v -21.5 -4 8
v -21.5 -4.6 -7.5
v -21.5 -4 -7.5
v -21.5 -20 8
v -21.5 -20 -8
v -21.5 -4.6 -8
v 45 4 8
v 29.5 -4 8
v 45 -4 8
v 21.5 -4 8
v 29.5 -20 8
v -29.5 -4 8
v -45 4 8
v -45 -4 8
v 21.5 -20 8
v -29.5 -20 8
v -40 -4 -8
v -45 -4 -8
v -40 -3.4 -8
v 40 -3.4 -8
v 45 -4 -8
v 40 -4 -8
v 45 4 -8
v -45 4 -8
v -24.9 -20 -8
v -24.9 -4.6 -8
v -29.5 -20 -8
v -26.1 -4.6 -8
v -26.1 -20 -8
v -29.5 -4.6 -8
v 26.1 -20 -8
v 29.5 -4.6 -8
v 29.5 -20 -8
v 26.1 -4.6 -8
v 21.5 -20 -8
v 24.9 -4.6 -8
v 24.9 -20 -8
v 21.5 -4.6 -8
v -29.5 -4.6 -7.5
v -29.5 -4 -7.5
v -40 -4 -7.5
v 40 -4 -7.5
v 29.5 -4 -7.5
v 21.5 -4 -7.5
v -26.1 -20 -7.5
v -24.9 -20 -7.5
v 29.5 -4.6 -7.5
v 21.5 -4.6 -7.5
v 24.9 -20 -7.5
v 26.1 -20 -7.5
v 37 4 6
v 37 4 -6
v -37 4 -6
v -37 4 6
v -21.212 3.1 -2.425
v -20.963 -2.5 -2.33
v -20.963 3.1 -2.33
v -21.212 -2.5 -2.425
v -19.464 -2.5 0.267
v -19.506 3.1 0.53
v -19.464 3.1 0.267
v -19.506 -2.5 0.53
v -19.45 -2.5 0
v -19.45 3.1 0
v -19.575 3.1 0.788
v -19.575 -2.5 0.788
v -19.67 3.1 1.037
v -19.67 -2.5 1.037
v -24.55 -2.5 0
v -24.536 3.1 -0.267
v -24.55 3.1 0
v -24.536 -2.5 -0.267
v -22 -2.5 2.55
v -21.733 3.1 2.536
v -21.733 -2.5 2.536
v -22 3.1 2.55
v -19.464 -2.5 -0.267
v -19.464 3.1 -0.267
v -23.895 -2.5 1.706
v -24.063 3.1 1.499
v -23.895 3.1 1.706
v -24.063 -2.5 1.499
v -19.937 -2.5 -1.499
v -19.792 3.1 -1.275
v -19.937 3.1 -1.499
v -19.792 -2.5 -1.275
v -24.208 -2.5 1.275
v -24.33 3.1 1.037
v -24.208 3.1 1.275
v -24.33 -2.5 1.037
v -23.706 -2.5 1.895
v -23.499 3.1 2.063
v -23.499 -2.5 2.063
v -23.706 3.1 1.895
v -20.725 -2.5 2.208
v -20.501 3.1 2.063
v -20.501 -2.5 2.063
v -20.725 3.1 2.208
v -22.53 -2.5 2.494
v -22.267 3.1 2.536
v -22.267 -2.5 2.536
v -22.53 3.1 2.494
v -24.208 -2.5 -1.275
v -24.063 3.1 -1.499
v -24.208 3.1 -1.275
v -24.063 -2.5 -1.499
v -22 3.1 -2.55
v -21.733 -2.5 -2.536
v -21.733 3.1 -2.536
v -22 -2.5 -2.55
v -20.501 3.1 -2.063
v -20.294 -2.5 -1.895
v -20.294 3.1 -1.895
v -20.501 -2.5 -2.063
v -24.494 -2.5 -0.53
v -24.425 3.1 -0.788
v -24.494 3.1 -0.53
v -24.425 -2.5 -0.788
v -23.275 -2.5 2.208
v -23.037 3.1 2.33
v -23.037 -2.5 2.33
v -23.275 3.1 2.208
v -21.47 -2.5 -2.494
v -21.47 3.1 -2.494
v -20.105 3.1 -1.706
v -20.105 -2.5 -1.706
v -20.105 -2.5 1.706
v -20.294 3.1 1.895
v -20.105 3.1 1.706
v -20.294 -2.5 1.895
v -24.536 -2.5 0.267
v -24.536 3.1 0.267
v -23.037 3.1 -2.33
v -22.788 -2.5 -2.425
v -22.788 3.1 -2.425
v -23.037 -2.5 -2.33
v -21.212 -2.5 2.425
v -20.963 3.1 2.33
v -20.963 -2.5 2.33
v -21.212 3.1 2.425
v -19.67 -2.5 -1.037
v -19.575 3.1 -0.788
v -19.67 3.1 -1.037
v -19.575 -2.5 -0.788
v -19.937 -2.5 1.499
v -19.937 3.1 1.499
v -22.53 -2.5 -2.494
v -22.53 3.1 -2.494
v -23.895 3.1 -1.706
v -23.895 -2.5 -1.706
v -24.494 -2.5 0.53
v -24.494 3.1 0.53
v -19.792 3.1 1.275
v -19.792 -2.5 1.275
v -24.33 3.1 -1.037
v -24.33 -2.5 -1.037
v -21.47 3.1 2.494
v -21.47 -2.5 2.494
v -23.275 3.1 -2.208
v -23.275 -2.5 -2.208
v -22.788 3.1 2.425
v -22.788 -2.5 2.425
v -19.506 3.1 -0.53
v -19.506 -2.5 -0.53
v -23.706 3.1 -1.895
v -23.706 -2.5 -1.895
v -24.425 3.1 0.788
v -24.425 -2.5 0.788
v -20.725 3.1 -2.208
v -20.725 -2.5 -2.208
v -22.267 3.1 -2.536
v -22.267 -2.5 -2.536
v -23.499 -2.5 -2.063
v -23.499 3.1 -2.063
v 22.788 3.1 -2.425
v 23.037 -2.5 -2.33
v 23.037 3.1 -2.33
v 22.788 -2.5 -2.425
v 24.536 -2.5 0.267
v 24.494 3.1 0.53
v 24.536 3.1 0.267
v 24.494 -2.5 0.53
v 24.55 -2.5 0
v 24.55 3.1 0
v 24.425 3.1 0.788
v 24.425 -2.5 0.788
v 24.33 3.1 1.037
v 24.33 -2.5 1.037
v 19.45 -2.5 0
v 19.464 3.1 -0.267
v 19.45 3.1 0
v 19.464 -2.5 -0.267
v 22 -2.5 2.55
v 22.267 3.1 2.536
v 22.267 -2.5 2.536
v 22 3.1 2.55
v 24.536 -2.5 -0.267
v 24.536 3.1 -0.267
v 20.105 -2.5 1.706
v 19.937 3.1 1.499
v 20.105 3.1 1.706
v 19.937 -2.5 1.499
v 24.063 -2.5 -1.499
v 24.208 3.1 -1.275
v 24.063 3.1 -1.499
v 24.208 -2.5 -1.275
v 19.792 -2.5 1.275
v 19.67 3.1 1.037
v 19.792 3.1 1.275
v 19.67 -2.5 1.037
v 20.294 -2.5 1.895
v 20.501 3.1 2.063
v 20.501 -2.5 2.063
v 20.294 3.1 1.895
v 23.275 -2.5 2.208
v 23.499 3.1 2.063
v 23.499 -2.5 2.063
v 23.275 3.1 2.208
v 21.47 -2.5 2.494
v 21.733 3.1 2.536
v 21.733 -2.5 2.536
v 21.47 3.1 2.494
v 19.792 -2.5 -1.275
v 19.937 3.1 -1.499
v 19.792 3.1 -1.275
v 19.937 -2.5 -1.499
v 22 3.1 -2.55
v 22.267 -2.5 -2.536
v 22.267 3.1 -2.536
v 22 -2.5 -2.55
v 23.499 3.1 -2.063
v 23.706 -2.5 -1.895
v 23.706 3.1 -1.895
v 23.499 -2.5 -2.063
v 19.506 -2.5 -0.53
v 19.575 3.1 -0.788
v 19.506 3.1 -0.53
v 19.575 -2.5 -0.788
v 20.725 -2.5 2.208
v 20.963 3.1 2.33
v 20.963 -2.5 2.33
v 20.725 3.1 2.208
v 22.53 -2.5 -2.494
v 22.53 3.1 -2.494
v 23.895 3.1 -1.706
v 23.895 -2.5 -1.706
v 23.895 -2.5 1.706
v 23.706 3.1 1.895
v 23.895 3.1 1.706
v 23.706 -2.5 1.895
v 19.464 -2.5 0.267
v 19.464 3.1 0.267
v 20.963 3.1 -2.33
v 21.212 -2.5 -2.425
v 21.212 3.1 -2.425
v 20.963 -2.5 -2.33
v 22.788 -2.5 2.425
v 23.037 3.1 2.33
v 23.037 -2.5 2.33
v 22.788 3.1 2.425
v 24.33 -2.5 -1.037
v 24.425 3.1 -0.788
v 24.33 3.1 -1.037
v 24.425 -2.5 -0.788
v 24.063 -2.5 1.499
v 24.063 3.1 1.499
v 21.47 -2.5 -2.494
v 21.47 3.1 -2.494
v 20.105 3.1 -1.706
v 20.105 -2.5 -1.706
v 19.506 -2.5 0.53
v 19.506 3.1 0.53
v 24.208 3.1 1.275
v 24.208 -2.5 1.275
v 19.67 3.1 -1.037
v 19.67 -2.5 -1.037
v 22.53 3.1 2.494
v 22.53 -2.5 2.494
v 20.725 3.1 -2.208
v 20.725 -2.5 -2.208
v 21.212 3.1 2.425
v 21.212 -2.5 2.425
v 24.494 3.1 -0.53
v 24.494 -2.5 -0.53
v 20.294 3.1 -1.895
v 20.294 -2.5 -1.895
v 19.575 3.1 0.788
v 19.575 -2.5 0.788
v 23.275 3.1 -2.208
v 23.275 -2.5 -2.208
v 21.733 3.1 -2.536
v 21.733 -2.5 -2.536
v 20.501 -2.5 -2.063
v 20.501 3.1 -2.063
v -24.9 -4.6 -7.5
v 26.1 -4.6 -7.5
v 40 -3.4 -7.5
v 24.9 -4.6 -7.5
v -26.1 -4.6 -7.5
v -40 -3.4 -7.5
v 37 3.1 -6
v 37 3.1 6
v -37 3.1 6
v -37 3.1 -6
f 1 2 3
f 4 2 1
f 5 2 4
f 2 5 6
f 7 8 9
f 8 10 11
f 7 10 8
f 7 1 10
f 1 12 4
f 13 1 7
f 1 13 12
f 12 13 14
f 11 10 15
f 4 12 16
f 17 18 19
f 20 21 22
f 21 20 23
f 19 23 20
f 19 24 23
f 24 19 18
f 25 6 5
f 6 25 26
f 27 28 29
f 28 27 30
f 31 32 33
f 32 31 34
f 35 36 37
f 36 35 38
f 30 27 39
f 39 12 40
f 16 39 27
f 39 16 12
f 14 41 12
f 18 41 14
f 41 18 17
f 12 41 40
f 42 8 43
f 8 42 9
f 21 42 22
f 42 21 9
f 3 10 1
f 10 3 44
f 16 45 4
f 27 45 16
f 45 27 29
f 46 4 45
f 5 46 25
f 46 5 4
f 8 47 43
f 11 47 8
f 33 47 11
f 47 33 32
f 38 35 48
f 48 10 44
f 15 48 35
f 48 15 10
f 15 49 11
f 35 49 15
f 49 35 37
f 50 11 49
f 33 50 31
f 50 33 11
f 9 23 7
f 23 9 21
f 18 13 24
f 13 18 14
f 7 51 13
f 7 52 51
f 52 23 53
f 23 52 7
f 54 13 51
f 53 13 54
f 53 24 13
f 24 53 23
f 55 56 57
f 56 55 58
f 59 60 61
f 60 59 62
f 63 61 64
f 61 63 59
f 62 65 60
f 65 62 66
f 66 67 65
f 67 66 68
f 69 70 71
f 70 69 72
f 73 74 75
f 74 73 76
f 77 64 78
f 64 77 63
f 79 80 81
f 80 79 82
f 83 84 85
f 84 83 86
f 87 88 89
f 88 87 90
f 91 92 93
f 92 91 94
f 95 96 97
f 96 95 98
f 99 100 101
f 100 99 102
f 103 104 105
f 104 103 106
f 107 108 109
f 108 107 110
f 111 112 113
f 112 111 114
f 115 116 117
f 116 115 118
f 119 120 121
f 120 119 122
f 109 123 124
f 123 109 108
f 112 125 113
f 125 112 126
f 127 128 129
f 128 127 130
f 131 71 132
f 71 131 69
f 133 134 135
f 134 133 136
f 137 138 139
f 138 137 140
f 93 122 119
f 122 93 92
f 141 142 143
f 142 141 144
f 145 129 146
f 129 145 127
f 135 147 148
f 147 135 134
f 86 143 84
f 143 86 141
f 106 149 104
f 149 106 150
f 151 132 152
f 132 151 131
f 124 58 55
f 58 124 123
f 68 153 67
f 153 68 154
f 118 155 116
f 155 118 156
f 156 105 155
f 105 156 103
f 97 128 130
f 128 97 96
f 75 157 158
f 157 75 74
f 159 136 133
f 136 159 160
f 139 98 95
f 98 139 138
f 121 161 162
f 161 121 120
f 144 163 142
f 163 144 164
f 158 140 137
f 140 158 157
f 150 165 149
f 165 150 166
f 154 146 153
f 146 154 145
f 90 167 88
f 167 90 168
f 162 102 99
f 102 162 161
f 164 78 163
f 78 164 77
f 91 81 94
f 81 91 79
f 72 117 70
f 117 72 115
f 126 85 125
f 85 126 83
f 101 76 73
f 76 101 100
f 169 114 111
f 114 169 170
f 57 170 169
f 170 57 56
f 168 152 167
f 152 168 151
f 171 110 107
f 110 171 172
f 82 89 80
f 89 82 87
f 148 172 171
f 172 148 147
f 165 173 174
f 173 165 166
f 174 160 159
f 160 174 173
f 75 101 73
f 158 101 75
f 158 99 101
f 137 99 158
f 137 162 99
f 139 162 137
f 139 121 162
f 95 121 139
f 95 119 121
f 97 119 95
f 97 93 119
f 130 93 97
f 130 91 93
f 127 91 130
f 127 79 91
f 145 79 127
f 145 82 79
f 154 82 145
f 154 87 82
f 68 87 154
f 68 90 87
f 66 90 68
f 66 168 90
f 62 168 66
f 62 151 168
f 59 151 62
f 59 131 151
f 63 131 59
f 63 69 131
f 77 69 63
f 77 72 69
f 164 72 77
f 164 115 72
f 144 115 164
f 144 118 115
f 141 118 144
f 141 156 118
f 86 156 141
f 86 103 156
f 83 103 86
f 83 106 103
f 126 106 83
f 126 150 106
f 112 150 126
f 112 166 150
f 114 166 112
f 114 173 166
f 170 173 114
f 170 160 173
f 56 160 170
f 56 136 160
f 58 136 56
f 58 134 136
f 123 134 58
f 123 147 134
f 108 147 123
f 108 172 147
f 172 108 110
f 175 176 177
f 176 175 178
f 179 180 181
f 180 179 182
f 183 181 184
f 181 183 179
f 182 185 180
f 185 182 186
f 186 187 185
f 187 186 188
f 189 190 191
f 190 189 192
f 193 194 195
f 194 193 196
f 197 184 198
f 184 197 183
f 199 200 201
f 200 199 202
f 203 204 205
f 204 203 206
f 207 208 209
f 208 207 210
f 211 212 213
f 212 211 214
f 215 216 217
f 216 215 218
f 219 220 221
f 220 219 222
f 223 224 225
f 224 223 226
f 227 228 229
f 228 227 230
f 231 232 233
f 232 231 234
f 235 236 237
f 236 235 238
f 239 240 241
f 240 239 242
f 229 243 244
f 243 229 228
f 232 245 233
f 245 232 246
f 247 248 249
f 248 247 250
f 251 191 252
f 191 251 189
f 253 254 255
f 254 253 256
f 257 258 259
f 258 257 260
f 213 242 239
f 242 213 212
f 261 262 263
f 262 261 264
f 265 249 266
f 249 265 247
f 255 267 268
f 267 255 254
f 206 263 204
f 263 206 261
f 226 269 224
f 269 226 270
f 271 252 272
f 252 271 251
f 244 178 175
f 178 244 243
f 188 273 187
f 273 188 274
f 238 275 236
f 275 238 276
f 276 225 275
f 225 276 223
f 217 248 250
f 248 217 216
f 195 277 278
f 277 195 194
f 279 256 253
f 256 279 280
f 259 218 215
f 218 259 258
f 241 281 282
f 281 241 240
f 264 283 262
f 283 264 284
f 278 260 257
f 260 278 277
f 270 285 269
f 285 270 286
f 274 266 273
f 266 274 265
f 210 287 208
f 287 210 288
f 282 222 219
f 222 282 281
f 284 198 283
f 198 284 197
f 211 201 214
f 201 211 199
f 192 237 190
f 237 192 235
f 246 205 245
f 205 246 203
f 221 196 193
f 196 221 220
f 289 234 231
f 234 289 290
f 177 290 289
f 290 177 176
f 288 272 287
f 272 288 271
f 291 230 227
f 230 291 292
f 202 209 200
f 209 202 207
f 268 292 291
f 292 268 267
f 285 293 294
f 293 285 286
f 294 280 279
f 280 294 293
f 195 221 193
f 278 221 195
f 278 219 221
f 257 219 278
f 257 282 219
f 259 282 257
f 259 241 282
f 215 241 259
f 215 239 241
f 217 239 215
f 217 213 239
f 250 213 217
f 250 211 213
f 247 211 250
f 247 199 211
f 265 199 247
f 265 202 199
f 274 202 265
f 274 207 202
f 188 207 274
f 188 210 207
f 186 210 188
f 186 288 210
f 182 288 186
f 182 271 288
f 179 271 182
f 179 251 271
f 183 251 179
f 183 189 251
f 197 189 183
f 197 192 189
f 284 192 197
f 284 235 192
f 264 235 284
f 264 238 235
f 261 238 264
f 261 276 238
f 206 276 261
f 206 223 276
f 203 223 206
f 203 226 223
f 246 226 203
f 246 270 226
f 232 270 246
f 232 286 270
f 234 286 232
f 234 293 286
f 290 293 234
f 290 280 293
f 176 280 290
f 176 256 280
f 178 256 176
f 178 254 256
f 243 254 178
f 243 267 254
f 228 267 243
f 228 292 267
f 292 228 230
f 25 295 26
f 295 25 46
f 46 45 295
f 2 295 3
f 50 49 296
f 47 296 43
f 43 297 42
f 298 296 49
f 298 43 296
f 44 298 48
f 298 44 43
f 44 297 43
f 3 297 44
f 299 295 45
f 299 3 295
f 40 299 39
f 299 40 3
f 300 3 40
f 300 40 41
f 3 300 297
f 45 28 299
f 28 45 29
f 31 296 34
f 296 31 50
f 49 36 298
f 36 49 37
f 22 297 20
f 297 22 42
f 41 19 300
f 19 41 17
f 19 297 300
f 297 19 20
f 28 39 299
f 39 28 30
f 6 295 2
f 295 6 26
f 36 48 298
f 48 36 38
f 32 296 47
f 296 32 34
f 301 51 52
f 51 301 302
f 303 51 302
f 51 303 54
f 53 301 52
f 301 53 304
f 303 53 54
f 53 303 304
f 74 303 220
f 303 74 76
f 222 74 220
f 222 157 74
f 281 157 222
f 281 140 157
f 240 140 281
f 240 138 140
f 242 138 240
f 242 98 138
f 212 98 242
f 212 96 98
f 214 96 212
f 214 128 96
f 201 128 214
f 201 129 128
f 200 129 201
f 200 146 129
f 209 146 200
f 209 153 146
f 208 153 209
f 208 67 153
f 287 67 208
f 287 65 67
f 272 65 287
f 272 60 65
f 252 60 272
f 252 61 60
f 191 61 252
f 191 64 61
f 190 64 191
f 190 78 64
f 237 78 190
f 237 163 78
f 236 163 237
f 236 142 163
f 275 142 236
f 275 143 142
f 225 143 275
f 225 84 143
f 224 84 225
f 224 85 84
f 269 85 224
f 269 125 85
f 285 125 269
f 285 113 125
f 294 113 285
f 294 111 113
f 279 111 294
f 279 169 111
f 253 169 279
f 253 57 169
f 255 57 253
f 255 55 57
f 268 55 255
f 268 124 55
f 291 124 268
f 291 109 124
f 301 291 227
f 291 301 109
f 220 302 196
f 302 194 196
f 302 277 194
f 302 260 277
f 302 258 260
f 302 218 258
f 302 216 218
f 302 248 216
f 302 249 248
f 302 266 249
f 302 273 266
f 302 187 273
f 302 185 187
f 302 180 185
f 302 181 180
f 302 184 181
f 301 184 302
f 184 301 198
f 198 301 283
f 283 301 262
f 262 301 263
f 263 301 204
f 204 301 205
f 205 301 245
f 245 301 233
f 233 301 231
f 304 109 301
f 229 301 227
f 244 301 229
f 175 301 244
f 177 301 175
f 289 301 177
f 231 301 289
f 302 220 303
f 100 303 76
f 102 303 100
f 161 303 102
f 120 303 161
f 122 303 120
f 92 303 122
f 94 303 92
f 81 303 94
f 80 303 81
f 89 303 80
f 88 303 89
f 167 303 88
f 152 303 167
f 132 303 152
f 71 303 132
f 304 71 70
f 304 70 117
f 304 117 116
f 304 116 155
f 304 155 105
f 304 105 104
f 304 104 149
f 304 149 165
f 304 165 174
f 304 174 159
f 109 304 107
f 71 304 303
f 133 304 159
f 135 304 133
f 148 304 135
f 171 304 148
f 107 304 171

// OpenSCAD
// Matrix Biomimetic Utilities - RC Attachable Upgrade: Firefly LED Bumper
// Version 1.0.0-Upgrade Core | Integrated Night Vision Protection Shield

BUMPER_SPAN = 90.0;       // Total frontal wrap-around crash protection width (mm)
LED_SOCKET_R = 2.55;      // Precision clearance pocket for standard 5mm hobby LED bulbs (mm)
CHASSIS_W = 85.0;          // Main vehicle scale footprint match reference

$fn = 60;

module RC_Firefly_LED_Bumper() {
    difference() {
        union() {
            // 1. REINFORCED FRONT EXOSKELETON WING BUMPER (Printed in High-Impact TPU)
            cube([BUMPER_SPAN, 8.0, 16.0], center=true);
            
            // Rearward Mounting Arms (Slid and friction lock flat over the nose)
            for (x_arm = [-CHASSIS_W*0.3, CHASSIS_W*0.3]) {
                translate([x_arm, -12.0, 0])
                    cube([8.0, 16.0, 16.0], center=true);
            }
        }
        
        // 2. BIOMIMETIC LENS APERTURES: FIREFLY LUMINESCENT LIGHT SOCKETS
        // Forward-facing push-fit chambers accept 5mm bulbs tightly with zero screws required
        for (x_led = [-22.0, 22.0]) {
            translate([x_led, 5.0, 0])
                rotate([90, 0, 0]) {
                    cylinder(h=15.0, r=LED_SOCKET_R, center=true); // Main bulb bay
                    translate([0, 0, -6.0])
                        cylinder(h=10.0, r=1.0, center=true); // Wire lead passthrough exit
                }
        }
        
        // 3. INTEGRATED 1MM CONCENTRIC WIRE-ROUTING GUTTER TRACKS
        // Completely isolates and shields incoming electrical lines from debris and tyre strikes
        translate([0, -4.0, -8.1])
            cube([BUMPER_SPAN - 10.0, 1.2, 1.2], center=true);
        for (x_gutter = [-CHASSIS_W*0.3, CHASSIS_W*0.3]) {
            translate([x_gutter, -12.0, -8.1])
                cube([1.2, 16.0, 1.2], center=true);
        }
        
        // Front Face Core Hollowing (Reduces frontal mass overload parameters)
        translate([0, 4.1, 0])
            cube([BUMPER_SPAN - 16.0, 2.0, 12.0], center=true);
    }
}

RC_Firefly_LED_Bumper();
